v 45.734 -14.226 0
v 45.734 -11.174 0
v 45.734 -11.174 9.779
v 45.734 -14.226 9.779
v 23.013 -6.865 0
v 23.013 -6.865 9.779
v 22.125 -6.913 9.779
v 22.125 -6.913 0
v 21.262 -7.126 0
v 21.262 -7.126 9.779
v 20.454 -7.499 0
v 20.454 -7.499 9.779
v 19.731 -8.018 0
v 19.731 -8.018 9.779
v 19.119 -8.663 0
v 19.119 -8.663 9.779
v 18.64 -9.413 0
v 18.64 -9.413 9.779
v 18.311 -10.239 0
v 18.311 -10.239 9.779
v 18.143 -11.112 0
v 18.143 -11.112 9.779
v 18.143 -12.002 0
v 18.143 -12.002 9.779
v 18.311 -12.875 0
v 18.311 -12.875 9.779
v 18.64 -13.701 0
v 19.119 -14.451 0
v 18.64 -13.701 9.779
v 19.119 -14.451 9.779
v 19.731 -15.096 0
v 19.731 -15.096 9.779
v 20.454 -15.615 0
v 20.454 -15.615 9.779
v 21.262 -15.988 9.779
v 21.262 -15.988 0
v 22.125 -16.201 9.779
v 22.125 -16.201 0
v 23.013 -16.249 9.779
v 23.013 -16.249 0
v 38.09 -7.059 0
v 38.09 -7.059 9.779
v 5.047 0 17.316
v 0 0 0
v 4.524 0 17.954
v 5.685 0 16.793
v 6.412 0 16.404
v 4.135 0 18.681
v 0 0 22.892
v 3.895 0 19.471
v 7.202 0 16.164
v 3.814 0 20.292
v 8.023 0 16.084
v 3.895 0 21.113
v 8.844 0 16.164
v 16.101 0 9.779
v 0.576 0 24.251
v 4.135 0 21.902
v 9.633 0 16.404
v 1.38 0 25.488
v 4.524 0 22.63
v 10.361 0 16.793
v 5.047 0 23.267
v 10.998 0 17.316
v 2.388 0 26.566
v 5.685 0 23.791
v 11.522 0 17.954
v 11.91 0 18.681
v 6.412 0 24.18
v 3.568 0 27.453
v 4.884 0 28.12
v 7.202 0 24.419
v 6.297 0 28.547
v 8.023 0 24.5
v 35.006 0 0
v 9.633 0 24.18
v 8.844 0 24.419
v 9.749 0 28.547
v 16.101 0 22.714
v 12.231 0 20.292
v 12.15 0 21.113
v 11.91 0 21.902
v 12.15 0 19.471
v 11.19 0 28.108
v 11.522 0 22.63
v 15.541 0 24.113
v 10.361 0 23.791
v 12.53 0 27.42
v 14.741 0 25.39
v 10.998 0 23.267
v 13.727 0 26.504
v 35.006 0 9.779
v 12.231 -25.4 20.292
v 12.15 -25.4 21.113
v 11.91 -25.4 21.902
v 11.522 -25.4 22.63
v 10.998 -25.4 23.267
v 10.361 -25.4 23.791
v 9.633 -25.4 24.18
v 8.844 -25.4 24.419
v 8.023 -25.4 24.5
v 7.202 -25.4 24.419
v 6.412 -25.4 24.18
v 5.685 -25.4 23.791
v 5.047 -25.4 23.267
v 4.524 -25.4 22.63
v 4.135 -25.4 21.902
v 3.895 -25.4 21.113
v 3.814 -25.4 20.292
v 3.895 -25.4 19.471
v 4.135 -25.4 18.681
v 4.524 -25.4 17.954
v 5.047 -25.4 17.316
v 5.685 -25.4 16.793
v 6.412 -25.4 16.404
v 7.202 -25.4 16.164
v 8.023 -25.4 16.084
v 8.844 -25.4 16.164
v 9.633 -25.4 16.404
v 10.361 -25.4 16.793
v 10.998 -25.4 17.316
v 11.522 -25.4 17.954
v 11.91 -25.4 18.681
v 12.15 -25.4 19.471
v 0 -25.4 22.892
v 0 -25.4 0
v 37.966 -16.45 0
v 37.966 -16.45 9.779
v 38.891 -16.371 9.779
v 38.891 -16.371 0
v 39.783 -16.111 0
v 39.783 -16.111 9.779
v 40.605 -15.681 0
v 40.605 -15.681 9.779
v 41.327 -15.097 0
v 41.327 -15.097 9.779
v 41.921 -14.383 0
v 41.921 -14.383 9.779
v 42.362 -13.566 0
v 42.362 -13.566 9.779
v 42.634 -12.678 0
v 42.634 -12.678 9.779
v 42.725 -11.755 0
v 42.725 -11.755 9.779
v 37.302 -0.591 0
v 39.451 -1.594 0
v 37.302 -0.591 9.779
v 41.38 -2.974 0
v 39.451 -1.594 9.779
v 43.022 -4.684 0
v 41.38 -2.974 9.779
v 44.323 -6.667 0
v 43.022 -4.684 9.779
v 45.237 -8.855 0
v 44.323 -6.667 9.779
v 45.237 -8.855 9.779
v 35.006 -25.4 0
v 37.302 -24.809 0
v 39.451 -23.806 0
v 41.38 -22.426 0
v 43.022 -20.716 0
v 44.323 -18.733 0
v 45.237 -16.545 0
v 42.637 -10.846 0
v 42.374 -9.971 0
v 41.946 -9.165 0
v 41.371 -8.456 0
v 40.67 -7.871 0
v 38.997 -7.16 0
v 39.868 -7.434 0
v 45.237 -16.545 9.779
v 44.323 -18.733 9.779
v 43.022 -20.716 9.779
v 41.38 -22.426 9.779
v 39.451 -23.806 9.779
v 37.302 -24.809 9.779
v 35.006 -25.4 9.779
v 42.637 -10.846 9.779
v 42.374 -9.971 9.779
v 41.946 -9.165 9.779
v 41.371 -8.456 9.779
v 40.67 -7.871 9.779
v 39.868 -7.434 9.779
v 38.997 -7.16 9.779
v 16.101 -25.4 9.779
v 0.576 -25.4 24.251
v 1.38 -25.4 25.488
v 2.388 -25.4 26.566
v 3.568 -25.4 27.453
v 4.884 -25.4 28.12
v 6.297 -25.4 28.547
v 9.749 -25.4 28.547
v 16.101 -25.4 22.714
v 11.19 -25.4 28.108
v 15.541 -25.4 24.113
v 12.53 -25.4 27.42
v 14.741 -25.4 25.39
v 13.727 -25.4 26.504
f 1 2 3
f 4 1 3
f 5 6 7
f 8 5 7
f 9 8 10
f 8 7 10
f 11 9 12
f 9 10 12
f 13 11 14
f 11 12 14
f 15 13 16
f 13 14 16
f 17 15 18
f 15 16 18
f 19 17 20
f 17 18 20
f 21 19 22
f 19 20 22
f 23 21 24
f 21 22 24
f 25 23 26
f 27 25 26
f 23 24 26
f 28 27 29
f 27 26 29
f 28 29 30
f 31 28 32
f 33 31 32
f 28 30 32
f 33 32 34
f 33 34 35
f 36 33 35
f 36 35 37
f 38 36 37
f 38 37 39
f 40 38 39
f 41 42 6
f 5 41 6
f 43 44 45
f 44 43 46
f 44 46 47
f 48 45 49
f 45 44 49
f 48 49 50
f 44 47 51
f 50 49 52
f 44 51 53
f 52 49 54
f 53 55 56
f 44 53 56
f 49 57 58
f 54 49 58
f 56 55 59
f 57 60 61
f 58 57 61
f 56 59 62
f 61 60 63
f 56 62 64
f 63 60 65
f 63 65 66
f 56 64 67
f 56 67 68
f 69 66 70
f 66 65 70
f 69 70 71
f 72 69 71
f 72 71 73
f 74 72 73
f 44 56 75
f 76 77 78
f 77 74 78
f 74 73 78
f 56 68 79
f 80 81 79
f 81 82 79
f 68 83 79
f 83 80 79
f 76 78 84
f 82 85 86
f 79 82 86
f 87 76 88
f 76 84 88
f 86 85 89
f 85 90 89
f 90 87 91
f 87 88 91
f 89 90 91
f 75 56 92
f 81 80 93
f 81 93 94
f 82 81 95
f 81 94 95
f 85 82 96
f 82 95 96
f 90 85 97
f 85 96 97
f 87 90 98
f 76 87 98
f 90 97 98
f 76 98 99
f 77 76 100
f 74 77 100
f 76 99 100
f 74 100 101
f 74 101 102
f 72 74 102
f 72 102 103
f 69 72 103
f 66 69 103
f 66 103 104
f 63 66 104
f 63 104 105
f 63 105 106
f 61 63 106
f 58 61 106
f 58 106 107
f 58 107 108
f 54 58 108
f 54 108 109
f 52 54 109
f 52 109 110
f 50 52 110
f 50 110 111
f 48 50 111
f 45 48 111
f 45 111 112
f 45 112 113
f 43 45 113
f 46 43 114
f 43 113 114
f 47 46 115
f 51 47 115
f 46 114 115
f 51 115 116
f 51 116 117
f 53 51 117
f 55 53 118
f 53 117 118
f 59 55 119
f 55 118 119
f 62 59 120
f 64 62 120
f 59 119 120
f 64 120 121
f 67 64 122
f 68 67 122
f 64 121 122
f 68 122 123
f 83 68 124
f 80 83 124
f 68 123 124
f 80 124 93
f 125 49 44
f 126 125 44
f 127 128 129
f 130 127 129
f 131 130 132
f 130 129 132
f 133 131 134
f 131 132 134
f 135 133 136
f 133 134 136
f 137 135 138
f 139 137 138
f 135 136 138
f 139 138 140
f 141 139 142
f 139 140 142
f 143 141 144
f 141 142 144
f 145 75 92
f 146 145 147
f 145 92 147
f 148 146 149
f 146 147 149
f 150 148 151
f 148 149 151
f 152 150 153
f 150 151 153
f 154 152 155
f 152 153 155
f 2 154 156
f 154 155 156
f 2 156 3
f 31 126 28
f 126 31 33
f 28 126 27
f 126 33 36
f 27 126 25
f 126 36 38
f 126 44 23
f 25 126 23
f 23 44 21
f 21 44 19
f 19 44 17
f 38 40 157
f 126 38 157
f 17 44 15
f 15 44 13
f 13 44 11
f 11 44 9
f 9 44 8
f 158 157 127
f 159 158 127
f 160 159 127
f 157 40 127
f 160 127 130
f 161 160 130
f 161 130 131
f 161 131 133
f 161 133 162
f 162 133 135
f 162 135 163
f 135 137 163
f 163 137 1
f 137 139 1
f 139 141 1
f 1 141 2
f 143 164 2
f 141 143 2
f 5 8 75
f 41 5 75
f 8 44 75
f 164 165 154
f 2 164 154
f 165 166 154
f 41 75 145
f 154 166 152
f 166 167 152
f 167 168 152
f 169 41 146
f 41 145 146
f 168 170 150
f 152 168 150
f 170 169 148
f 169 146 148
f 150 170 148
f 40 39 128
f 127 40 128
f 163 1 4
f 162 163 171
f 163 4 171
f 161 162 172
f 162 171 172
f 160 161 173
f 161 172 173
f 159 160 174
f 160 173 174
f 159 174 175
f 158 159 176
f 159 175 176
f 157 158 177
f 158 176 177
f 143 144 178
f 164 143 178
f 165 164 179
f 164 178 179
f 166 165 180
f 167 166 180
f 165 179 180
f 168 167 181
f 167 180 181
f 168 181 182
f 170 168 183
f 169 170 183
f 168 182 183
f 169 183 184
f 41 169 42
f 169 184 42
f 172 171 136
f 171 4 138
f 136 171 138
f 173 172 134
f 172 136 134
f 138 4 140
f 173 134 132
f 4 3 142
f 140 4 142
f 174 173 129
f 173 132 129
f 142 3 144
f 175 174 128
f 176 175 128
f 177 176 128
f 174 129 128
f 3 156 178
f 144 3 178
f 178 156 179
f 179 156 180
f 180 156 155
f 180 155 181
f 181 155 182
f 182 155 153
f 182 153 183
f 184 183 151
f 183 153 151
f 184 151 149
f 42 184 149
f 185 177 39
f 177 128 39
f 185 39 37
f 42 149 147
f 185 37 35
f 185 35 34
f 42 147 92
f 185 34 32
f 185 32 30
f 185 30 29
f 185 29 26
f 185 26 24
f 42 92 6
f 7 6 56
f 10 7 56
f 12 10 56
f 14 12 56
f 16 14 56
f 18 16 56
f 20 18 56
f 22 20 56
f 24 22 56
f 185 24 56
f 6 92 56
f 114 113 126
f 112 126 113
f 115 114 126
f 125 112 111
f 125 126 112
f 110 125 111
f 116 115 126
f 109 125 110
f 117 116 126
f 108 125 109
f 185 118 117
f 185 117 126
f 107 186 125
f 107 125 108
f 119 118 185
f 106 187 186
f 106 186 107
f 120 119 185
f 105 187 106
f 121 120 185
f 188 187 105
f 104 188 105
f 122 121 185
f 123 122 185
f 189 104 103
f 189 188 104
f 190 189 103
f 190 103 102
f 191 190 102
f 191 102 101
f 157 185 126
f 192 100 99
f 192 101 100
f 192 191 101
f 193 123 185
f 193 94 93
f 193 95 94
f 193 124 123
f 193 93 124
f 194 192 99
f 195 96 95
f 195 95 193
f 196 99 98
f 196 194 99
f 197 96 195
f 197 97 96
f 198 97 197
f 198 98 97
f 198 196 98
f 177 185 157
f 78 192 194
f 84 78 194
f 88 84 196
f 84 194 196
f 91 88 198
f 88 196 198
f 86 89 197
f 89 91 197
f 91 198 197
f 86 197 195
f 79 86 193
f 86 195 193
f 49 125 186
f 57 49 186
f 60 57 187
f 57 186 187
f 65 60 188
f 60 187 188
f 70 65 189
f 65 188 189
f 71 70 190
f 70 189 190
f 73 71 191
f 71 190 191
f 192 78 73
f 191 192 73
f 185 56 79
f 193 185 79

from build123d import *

# Parameters (mm, degrees)
F1_DEPTH = 25.4
F3_DEPTH = 9.7799997235
F5_DEPTH = 9.7799997235
F7_DEPTH = 25.401
F8_R     = 4.2081540675
F9_DEPTH = 25.401


with BuildPart() as f1:
    # F0 (on Front) → F1 (new body)
    with BuildSketch(Plane.XZ):
        Polygon((0, 28.5467784852), (0, 0), (45.7341149449, 0), (45.7341149449, 9.7789997235), (16.1007773131, 9.7789997235), (16.1007773131, 28.5467784852), align=None)
    extrude(amount=F1_DEPTH)

    # F2 (on face) → F3 (cut, through all)
    with BuildSketch(Plane.XY.offset(9.7789997235)):
        with BuildLine():
            ThreePointArc((23.013047613, -16.2487795257), (26.2065060315, -14.8076541333), (27.5135145448, -11.5570006892))
            ThreePointArc((27.5135145448, -11.5570006892), (26.2065060315, -8.3063472451), (23.013047613, -6.8652218527))
            ThreePointArc((23.013047613, -6.8652218527), (18.1218243279, -11.5570006892), (23.013047613, -16.2487795257))
        make_face()
        with BuildLine():
            ThreePointArc((23.013047613, -6.8652218527), (26.2065060315, -8.3063472451), (27.5135145448, -11.5570006892))
            ThreePointArc((27.5135145448, -11.5570006892), (26.2065060315, -14.8076541333), (23.013047613, -16.2487795257))
            Line((23.013047613, -16.2487795257), (37.966271611, -16.4499710275))
            ThreePointArc((37.966271611, -16.4499710275), (33.334012479, -11.6927764727), (38.0898284635, -7.0591020107))
            Line((38.0898284635, -7.0591020107), (23.013047613, -6.8652218527))
        make_face()
        with BuildLine():
            ThreePointArc((42.7252883073, -11.7545549017), (41.3711881032, -8.4555108805), (38.0898284635, -7.0591020107))
            ThreePointArc((38.0898284635, -7.0591020107), (33.334012479, -11.6927764727), (37.966271611, -16.4499710275))
            ThreePointArc((37.966271611, -16.4499710275), (41.327496713, -15.0972773142), (42.7252883073, -11.7545549017))
        make_face()
    extrude(amount=-F3_DEPTH, mode=Mode.SUBTRACT)

    # F4 (on face) → F5 (cut, through all)
    with BuildSketch(Plane.XY.offset(9.7789997235)):
        with BuildLine():
            ThreePointArc((35.0055416845, 0), (42.2404327965, -3.7910480752), (45.7341149449, -11.17412873))
            Line((45.7341149449, -11.17412873), (45.7341149449, 0))
            Line((45.7341149449, 0), (35.0055416845, 0))
        make_face()
        with BuildLine():
            ThreePointArc((45.7341149449, -14.22587127), (42.2404327965, -21.6089519248), (35.0055416845, -25.4))
            Line((35.0055416845, -25.4), (45.7341149449, -25.4))
            Line((45.7341149449, -25.4), (45.7341149449, -14.22587127))
        make_face()
    extrude(amount=-F5_DEPTH, mode=Mode.SUBTRACT)

    # F6 (on face) → F7 (cut, through all)
    with BuildSketch(Plane.XZ.offset(25.4)):
        with BuildLine():
            ThreePointArc((0, 22.8922715803), (2.3876784288, 26.566481818), (6.2965470963, 28.5467784852))
            Line((6.2965470963, 28.5467784852), (0, 28.5467784852))
            Line((0, 28.5467784852), (0, 22.8922715803))
        make_face()
        with BuildLine():
            ThreePointArc((9.7487572031, 28.5467784852), (13.7265705753, 26.5038761141), (16.1007773131, 22.7144709249))
            Line((16.1007773131, 22.7144709249), (16.1007773131, 28.5467784852))
            Line((16.1007773131, 28.5467784852), (9.7487572031, 28.5467784852))
        make_face()
    extrude(amount=-F7_DEPTH, mode=Mode.SUBTRACT)

    # F8 (on face) → F9 (cut, through all)
    with BuildSketch(Plane.XZ.offset(25.4)):
        with Locations((8.0226521497, 20.2916857982)):
            Circle(F8_R)
    extrude(amount=-F9_DEPTH, mode=Mode.SUBTRACT)


solid = f1.part
